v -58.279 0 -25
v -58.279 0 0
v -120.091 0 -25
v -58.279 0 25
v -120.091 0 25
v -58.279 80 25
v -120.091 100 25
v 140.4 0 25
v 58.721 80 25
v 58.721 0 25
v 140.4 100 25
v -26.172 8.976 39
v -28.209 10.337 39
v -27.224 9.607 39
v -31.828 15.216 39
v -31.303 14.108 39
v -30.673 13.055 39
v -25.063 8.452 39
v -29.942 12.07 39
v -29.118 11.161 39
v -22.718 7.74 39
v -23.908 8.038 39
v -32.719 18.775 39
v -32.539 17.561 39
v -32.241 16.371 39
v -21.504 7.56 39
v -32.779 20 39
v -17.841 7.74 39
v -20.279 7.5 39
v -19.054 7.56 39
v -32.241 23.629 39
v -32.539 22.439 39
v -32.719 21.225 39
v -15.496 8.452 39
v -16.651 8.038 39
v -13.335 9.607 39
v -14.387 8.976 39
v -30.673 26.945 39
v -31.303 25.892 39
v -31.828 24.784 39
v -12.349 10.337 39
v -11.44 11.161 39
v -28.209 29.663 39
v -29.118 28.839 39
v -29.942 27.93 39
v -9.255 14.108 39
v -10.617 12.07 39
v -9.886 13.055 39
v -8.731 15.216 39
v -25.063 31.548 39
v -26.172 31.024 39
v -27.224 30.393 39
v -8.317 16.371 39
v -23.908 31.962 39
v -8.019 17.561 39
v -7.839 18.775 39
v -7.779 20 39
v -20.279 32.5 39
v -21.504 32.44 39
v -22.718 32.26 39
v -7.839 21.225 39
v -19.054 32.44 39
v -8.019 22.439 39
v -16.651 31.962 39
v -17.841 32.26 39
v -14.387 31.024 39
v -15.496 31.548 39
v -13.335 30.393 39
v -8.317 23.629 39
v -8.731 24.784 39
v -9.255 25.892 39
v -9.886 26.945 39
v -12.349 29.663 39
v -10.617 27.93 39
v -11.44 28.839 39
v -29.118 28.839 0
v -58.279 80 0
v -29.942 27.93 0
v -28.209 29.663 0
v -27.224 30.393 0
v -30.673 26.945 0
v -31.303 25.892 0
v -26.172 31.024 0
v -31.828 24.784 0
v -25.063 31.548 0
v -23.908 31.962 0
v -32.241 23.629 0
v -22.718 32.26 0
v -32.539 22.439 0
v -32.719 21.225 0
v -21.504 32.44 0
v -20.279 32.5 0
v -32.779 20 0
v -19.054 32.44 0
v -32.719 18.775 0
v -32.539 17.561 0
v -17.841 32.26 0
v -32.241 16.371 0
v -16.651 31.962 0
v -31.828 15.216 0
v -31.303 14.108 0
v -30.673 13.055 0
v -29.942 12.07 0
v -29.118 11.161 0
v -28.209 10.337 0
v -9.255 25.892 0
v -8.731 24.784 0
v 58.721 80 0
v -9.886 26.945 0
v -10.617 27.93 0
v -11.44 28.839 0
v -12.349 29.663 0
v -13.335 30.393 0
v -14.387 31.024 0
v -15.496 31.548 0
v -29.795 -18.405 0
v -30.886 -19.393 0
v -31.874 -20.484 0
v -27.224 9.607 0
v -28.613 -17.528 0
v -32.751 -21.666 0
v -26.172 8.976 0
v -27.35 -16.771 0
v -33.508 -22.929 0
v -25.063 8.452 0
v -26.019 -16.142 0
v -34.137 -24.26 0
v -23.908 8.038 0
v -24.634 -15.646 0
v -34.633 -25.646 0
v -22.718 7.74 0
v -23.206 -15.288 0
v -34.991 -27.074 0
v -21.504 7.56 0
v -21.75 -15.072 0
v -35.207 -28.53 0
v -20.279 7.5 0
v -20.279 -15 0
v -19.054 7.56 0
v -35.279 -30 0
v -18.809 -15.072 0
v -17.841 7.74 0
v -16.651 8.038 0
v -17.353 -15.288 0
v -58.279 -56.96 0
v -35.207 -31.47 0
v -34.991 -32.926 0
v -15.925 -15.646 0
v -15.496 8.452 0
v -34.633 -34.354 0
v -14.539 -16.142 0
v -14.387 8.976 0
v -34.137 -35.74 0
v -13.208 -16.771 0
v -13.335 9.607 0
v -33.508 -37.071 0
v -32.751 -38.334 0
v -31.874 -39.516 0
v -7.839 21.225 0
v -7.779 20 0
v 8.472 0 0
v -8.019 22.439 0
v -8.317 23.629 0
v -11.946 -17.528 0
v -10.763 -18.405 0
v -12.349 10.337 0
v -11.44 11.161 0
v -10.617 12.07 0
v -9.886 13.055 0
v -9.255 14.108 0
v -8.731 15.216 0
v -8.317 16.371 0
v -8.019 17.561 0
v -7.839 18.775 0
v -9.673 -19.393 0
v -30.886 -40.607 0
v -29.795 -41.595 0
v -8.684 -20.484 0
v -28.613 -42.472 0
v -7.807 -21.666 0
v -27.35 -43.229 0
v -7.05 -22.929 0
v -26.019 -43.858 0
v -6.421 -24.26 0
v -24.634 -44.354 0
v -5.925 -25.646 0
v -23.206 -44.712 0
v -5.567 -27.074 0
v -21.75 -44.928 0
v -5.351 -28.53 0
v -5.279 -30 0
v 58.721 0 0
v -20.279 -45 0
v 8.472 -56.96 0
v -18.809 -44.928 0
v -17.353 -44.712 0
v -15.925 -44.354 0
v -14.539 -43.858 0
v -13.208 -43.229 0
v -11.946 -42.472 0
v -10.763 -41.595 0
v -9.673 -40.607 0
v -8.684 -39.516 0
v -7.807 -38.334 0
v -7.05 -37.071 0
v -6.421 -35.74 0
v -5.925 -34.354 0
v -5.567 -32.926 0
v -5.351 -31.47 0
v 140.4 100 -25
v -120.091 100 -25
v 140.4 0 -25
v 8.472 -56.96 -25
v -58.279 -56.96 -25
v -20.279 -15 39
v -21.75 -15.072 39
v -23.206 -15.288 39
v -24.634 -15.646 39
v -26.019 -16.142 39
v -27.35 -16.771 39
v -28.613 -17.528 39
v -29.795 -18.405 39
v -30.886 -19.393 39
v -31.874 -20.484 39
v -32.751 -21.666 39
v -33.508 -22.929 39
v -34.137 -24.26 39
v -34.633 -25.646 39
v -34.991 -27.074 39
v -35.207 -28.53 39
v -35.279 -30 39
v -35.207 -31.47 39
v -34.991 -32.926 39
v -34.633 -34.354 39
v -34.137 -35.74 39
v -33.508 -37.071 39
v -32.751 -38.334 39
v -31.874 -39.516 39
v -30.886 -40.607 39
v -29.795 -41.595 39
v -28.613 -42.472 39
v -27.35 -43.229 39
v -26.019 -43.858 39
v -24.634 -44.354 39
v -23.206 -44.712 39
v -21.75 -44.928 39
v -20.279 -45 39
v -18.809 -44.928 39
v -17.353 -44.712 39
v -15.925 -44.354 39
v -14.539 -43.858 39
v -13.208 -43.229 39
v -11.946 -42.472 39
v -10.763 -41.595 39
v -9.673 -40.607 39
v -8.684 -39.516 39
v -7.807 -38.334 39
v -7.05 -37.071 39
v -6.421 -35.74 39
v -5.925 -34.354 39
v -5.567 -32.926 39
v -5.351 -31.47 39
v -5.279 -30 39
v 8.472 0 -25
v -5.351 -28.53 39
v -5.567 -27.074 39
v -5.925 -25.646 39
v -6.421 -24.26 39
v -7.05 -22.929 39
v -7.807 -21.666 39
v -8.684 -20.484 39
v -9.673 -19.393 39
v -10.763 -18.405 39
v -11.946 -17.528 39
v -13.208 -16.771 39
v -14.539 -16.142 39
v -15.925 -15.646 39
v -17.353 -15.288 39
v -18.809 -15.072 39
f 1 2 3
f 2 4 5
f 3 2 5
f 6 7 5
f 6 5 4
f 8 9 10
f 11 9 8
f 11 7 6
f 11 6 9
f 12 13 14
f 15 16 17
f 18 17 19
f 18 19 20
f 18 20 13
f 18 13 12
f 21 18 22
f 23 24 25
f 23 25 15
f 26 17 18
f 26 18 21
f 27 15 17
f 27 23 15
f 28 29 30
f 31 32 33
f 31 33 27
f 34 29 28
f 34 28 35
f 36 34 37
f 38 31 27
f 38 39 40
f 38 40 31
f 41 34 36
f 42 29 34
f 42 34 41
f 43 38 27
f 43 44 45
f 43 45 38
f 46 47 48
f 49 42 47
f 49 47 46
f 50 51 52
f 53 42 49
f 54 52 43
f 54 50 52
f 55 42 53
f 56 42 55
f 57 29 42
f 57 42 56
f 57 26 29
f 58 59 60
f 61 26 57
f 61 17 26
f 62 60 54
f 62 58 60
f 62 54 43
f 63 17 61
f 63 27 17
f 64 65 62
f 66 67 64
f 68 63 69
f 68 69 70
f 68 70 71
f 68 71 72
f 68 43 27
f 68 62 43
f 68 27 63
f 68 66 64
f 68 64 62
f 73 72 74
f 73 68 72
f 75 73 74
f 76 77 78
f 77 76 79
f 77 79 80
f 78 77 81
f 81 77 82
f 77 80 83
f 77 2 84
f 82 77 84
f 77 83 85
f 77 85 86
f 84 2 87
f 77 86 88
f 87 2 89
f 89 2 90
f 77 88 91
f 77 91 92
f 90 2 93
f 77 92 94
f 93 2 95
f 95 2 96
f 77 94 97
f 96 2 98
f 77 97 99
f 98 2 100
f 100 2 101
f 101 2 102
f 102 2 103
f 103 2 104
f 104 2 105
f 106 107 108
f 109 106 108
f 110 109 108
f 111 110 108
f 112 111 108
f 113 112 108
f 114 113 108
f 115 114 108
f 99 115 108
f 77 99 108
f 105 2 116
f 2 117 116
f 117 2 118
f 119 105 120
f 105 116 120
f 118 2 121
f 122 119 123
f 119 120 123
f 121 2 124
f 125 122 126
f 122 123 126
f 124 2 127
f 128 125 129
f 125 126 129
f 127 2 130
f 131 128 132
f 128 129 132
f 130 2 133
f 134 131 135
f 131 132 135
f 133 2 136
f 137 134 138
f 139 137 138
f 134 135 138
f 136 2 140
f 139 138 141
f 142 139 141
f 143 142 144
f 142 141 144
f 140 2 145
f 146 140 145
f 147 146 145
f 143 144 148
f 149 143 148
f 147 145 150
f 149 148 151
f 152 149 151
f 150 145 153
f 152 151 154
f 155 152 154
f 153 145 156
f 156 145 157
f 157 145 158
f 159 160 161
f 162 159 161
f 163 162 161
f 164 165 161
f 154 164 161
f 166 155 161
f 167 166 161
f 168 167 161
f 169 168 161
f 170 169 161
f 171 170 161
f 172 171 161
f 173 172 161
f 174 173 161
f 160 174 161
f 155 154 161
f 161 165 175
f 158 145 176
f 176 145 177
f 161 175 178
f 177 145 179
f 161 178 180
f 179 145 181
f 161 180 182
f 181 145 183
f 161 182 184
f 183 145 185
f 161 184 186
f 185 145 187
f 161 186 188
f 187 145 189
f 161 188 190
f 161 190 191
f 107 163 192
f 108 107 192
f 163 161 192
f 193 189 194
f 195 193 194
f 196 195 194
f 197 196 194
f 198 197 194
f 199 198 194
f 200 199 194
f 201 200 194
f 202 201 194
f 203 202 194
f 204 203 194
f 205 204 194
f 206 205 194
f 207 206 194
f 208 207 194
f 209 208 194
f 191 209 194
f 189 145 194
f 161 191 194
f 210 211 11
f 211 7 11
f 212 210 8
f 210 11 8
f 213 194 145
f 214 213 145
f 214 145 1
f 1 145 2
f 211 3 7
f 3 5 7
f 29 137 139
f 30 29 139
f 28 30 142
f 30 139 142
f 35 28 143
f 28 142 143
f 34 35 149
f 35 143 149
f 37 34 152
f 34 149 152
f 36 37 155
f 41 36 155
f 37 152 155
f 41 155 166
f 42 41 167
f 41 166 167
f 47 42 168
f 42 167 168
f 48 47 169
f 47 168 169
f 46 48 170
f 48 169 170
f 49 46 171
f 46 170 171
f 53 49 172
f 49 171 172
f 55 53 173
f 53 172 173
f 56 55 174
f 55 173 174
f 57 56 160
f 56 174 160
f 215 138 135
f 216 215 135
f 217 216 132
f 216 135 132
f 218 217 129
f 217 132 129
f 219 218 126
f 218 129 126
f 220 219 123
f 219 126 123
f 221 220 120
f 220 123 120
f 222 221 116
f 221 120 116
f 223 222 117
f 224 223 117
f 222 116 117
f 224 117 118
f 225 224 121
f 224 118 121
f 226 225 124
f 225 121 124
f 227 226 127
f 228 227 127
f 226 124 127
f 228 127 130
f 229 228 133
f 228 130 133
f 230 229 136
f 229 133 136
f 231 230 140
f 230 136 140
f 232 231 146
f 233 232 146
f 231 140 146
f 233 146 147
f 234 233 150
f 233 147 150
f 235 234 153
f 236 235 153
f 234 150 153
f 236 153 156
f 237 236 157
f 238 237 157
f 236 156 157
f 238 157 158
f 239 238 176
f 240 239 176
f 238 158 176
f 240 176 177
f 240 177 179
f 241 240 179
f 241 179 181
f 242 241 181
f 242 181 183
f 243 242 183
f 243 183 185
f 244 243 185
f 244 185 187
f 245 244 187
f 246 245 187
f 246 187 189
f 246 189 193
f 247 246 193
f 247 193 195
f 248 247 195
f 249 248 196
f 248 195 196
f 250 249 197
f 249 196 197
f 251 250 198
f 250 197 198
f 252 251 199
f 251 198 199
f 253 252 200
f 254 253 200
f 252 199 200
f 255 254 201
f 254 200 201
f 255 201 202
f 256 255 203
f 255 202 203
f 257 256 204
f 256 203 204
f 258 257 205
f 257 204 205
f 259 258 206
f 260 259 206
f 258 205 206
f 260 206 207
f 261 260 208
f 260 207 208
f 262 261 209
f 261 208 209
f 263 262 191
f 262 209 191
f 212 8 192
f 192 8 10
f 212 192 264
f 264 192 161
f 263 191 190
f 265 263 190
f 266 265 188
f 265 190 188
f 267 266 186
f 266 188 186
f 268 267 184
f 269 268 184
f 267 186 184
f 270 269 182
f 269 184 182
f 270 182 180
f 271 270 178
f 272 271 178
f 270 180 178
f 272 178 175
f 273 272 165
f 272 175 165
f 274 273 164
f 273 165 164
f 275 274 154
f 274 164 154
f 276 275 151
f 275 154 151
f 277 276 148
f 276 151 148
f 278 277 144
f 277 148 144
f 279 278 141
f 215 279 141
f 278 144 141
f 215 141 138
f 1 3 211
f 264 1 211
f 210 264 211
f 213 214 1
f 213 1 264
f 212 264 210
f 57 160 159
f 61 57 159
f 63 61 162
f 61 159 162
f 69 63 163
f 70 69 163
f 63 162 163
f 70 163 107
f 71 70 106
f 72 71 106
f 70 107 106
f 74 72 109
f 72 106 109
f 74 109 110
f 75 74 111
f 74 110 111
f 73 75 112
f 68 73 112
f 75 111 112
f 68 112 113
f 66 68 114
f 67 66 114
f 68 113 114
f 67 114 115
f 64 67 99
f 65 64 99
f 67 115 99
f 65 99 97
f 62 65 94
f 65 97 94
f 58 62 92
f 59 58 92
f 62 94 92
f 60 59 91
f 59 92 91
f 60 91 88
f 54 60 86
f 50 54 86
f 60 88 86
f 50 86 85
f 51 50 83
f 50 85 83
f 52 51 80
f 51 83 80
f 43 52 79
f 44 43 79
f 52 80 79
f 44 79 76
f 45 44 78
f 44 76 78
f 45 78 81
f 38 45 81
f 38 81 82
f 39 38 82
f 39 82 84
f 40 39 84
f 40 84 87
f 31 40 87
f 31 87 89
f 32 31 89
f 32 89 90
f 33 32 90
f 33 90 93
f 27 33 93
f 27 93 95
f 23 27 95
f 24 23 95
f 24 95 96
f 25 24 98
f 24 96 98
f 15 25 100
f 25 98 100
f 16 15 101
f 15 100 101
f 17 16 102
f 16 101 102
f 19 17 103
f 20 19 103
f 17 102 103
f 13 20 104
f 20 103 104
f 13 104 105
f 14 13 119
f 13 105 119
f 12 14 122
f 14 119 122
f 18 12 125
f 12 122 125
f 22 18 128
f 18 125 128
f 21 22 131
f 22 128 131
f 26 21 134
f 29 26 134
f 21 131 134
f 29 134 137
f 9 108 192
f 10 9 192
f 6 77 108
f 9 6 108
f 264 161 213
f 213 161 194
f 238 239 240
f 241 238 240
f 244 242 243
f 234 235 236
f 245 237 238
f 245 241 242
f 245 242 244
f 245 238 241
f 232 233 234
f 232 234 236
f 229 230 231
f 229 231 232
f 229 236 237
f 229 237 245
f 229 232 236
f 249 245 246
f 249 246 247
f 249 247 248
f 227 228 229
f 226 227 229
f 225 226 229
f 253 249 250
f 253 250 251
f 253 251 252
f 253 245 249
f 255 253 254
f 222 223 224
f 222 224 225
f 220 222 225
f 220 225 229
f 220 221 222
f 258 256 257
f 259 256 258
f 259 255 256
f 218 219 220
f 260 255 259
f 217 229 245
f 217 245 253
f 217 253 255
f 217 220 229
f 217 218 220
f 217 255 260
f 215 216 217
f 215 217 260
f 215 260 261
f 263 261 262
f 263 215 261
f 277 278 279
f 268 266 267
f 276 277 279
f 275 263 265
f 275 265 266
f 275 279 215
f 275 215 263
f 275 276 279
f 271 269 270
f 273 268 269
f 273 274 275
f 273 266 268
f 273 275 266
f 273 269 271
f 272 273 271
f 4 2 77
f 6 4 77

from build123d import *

# Parameters (mm, degrees)
F1_DEPTH = 25
F3_DEPTH = 25
F5_DEPTH = 39


with BuildPart() as f1:
    # F0 (on Top) → F1 (new body)
    with BuildSketch(Plane.XY):
        Polygon((-120.090559, 100), (-120.090559, 0), (-58.279246, 0), (-58.279246, 80), (58.720754, 80), (58.720754, 0), (140.4, 0), (140.4, 100), align=None)
    extrude(amount=F1_DEPTH)

    # F2 (on face) → F3 (join)
    with BuildSketch(Plane(origin=(0, 0, 0), x_dir=(1, 0, 0), z_dir=(0, 0, -1))):
        Polygon((-58.279246, 0), (-120.090559, 0), (-120.090559, -100), (140.4, -100), (140.4, 0), (8.472341, 0), (8.472341, 56.960292), (-58.279246, 56.960292), align=None)
    extrude(amount=F3_DEPTH)

    # F4 (on face) → F5 (join)
    with BuildSketch(Plane.XY):
        with BuildLine():
            ThreePointArc((-20.279246, 7.5), (-11.440411, 11.161165), (-7.779246, 20))
            ThreePointArc((-7.779246, 20), (-29.118081, 28.838835), (-20.279246, 7.5))
        make_face()
        with BuildLine():
            ThreePointArc((-5.279246, -30), (-9.672644, -19.393398), (-20.279246, -15))
            ThreePointArc((-20.279246, -15), (-30.885847, -40.606602), (-5.279246, -30))
        make_face()
    extrude(amount=F5_DEPTH)


solid = f1.part
